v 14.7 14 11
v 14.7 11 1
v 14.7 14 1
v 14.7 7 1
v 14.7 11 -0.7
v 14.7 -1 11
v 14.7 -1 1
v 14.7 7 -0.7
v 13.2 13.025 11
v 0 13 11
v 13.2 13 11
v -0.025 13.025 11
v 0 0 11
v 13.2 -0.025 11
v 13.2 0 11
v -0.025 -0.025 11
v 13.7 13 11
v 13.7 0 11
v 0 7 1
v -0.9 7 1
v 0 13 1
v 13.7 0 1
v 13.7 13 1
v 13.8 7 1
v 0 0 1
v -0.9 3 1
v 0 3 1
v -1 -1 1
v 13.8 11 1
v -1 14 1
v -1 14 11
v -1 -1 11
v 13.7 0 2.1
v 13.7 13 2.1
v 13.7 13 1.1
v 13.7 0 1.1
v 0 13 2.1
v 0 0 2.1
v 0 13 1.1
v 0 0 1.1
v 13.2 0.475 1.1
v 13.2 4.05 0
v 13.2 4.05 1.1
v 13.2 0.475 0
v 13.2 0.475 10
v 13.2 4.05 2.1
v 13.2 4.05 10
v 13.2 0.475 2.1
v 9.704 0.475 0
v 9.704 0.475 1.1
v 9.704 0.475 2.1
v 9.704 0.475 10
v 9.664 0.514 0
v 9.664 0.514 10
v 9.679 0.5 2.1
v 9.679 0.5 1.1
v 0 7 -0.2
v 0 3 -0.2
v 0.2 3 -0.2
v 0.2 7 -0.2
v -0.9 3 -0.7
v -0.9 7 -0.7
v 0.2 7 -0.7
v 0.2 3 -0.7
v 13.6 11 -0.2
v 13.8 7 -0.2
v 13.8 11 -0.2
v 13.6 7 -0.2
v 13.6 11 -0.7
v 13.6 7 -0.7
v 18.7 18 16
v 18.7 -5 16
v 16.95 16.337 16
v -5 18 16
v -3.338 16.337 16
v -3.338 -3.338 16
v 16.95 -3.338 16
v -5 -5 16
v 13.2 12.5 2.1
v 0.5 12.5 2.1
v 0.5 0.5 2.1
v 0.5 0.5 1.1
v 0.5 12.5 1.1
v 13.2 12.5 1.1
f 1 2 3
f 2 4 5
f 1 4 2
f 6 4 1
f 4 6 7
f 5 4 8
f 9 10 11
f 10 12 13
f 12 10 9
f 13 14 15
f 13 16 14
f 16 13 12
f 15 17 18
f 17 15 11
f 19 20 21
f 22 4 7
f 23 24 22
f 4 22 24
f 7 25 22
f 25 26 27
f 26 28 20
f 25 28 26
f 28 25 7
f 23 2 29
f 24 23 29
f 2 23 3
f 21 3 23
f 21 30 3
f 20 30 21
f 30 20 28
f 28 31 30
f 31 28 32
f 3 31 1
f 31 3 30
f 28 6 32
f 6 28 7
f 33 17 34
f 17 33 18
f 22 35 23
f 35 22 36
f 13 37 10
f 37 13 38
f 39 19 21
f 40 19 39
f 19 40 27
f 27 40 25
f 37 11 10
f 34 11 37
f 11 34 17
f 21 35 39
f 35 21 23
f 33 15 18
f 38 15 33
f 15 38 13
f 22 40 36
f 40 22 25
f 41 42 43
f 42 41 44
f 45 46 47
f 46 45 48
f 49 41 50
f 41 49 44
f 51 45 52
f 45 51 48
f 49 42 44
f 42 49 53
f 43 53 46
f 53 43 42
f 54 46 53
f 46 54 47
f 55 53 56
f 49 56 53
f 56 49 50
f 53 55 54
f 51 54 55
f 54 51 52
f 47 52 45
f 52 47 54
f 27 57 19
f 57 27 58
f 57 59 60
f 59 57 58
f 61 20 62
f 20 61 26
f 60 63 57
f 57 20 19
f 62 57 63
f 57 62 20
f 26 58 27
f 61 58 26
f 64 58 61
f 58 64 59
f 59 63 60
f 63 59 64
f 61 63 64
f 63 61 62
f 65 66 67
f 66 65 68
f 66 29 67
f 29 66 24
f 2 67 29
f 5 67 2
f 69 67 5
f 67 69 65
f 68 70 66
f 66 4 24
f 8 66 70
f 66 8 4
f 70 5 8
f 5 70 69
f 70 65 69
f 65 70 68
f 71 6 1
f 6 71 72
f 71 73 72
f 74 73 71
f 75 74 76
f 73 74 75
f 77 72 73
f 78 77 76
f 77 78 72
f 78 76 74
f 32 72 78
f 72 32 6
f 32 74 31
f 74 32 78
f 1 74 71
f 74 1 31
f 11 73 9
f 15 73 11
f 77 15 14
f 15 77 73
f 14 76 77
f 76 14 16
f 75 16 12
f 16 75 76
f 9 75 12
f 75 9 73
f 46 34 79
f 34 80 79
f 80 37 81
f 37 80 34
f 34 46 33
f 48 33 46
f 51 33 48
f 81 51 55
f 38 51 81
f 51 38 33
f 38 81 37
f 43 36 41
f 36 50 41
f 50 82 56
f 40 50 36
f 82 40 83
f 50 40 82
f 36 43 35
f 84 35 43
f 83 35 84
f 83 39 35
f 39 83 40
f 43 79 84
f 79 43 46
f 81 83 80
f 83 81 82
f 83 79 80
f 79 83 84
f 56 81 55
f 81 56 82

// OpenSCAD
$fn = 100;

translate([0,0,1]){
difference(){

translate([-1,-1,0]){
cube([13.7+2,13+2,10]);
}
translate([0,0,-5]){
cube([13.7, 13, 40]);
}


}

color("blue"){
translate([-0.5,14.05,8]){
rotate([180,0,0]){
translate([13.7,10,-1]){
difference(){
rotate([0,0,45]){
cube([5,5,10]);
}
translate([0,0,-2]){
cube([10,10,15]);
translate([-5,3.575,0]){
cube([10,10,15]);
}
}
}
}
}
}
}
}

translate([0,-4,0]){
translate([-0.9,7,-0.2]){
cube([0.9,4,1.2]);
}
translate([-0.9,7,-0.7]){
cube([1.1,4,0.5]);
}
}

translate([0,4,0]){
translate([13.8,3,-0.2]){
cube([0.9,4,1.2]);
}
translate([13.6,3,-0.7]){
cube([1.1,4,0.5]);
}
}

//color("green"){
//headpost();
//}


module headpost(){
difference(){
cube([13.6,13.3,1]);
translate([13.6/2,13.3/2,-2]){
cylinder(d=9.65,h=6);
}
translate([13.6,9.4,-5]){
rotate([0,0,45]){
cube([5.5,5.5,10]);
}
}
}

translate([-9.8,0,0]){
cube([9.8,3.5,1]);
}

translate([10,2,0]){
rotate([0,0,-38]){
cube([17.9,2.3,1]);
}
}
}

CubePoints = [
  [  -1,  -1,  0 ],  //0
  [ 14.7,  -1,  0 ],  //1
  [ 14.7,  14,  0 ],  //2
  [  -1,  14,  0 ],  //3
  [  -5,  -5,  5 ],  //4
  [ 13.7+5,  -5,  5 ],  //5
  [ 13.7+5,  13+5,  5 ],  //6
  [  -5,  13+5,  5 ]]; //7
CubeFaces = [
  [0,1,2,3],  // bottom
  [4,5,1,0],  // front
  [7,6,5,4],  // top
  [5,6,2,1],  // right
  [6,7,3,2],  // back
  [7,4,0,3]]; // left
  
  
CubePoints2 = [
  [  1.3,  1.3,  0 ],  //0
  [ 11.7,  1.3,  0 ],  //1
  [ 11.7,  11.7,  0 ],  //2
  [  1.3,  11.7,  0 ],  //3
  [  -4,  -4,  8 ],  //4
  [ 12.7+5,  -4,  8 ],  //5
  [ 12.7+5,  12+5,  8 ],  //6
  [  -4,  12+5,  8 ]]; //7
CubeFaces2 = [
  [0,1,2,3],  // bottom
  [4,5,1,0],  // front
  [7,6,5,4],  // top
  [5,6,2,1],  // right
  [6,7,3,2],  // back
  [7,4,0,3]]; // left

difference(){
color("limegreen"){ 
translate([0,0,11]){
polyhedron( CubePoints, CubeFaces );
}
}

color("magenta"){
translate([0,0,9]){
polyhedron( CubePoints2, CubeFaces2);
}
}
}
//difference(){
//    
//    translate([0,0,1]){
//        cube([14,14,0.25]);
//    }
//    translate([13.7/2,13.5/2,0]){
//    cylinder(d=10,h=10);
//    }
//}

translate([0,0,1.1]){
difference(){
cube([13.7,13,1]);
translate([0.5,0.5,-2]){
cube([12.7,12,4]);
}
}
}
